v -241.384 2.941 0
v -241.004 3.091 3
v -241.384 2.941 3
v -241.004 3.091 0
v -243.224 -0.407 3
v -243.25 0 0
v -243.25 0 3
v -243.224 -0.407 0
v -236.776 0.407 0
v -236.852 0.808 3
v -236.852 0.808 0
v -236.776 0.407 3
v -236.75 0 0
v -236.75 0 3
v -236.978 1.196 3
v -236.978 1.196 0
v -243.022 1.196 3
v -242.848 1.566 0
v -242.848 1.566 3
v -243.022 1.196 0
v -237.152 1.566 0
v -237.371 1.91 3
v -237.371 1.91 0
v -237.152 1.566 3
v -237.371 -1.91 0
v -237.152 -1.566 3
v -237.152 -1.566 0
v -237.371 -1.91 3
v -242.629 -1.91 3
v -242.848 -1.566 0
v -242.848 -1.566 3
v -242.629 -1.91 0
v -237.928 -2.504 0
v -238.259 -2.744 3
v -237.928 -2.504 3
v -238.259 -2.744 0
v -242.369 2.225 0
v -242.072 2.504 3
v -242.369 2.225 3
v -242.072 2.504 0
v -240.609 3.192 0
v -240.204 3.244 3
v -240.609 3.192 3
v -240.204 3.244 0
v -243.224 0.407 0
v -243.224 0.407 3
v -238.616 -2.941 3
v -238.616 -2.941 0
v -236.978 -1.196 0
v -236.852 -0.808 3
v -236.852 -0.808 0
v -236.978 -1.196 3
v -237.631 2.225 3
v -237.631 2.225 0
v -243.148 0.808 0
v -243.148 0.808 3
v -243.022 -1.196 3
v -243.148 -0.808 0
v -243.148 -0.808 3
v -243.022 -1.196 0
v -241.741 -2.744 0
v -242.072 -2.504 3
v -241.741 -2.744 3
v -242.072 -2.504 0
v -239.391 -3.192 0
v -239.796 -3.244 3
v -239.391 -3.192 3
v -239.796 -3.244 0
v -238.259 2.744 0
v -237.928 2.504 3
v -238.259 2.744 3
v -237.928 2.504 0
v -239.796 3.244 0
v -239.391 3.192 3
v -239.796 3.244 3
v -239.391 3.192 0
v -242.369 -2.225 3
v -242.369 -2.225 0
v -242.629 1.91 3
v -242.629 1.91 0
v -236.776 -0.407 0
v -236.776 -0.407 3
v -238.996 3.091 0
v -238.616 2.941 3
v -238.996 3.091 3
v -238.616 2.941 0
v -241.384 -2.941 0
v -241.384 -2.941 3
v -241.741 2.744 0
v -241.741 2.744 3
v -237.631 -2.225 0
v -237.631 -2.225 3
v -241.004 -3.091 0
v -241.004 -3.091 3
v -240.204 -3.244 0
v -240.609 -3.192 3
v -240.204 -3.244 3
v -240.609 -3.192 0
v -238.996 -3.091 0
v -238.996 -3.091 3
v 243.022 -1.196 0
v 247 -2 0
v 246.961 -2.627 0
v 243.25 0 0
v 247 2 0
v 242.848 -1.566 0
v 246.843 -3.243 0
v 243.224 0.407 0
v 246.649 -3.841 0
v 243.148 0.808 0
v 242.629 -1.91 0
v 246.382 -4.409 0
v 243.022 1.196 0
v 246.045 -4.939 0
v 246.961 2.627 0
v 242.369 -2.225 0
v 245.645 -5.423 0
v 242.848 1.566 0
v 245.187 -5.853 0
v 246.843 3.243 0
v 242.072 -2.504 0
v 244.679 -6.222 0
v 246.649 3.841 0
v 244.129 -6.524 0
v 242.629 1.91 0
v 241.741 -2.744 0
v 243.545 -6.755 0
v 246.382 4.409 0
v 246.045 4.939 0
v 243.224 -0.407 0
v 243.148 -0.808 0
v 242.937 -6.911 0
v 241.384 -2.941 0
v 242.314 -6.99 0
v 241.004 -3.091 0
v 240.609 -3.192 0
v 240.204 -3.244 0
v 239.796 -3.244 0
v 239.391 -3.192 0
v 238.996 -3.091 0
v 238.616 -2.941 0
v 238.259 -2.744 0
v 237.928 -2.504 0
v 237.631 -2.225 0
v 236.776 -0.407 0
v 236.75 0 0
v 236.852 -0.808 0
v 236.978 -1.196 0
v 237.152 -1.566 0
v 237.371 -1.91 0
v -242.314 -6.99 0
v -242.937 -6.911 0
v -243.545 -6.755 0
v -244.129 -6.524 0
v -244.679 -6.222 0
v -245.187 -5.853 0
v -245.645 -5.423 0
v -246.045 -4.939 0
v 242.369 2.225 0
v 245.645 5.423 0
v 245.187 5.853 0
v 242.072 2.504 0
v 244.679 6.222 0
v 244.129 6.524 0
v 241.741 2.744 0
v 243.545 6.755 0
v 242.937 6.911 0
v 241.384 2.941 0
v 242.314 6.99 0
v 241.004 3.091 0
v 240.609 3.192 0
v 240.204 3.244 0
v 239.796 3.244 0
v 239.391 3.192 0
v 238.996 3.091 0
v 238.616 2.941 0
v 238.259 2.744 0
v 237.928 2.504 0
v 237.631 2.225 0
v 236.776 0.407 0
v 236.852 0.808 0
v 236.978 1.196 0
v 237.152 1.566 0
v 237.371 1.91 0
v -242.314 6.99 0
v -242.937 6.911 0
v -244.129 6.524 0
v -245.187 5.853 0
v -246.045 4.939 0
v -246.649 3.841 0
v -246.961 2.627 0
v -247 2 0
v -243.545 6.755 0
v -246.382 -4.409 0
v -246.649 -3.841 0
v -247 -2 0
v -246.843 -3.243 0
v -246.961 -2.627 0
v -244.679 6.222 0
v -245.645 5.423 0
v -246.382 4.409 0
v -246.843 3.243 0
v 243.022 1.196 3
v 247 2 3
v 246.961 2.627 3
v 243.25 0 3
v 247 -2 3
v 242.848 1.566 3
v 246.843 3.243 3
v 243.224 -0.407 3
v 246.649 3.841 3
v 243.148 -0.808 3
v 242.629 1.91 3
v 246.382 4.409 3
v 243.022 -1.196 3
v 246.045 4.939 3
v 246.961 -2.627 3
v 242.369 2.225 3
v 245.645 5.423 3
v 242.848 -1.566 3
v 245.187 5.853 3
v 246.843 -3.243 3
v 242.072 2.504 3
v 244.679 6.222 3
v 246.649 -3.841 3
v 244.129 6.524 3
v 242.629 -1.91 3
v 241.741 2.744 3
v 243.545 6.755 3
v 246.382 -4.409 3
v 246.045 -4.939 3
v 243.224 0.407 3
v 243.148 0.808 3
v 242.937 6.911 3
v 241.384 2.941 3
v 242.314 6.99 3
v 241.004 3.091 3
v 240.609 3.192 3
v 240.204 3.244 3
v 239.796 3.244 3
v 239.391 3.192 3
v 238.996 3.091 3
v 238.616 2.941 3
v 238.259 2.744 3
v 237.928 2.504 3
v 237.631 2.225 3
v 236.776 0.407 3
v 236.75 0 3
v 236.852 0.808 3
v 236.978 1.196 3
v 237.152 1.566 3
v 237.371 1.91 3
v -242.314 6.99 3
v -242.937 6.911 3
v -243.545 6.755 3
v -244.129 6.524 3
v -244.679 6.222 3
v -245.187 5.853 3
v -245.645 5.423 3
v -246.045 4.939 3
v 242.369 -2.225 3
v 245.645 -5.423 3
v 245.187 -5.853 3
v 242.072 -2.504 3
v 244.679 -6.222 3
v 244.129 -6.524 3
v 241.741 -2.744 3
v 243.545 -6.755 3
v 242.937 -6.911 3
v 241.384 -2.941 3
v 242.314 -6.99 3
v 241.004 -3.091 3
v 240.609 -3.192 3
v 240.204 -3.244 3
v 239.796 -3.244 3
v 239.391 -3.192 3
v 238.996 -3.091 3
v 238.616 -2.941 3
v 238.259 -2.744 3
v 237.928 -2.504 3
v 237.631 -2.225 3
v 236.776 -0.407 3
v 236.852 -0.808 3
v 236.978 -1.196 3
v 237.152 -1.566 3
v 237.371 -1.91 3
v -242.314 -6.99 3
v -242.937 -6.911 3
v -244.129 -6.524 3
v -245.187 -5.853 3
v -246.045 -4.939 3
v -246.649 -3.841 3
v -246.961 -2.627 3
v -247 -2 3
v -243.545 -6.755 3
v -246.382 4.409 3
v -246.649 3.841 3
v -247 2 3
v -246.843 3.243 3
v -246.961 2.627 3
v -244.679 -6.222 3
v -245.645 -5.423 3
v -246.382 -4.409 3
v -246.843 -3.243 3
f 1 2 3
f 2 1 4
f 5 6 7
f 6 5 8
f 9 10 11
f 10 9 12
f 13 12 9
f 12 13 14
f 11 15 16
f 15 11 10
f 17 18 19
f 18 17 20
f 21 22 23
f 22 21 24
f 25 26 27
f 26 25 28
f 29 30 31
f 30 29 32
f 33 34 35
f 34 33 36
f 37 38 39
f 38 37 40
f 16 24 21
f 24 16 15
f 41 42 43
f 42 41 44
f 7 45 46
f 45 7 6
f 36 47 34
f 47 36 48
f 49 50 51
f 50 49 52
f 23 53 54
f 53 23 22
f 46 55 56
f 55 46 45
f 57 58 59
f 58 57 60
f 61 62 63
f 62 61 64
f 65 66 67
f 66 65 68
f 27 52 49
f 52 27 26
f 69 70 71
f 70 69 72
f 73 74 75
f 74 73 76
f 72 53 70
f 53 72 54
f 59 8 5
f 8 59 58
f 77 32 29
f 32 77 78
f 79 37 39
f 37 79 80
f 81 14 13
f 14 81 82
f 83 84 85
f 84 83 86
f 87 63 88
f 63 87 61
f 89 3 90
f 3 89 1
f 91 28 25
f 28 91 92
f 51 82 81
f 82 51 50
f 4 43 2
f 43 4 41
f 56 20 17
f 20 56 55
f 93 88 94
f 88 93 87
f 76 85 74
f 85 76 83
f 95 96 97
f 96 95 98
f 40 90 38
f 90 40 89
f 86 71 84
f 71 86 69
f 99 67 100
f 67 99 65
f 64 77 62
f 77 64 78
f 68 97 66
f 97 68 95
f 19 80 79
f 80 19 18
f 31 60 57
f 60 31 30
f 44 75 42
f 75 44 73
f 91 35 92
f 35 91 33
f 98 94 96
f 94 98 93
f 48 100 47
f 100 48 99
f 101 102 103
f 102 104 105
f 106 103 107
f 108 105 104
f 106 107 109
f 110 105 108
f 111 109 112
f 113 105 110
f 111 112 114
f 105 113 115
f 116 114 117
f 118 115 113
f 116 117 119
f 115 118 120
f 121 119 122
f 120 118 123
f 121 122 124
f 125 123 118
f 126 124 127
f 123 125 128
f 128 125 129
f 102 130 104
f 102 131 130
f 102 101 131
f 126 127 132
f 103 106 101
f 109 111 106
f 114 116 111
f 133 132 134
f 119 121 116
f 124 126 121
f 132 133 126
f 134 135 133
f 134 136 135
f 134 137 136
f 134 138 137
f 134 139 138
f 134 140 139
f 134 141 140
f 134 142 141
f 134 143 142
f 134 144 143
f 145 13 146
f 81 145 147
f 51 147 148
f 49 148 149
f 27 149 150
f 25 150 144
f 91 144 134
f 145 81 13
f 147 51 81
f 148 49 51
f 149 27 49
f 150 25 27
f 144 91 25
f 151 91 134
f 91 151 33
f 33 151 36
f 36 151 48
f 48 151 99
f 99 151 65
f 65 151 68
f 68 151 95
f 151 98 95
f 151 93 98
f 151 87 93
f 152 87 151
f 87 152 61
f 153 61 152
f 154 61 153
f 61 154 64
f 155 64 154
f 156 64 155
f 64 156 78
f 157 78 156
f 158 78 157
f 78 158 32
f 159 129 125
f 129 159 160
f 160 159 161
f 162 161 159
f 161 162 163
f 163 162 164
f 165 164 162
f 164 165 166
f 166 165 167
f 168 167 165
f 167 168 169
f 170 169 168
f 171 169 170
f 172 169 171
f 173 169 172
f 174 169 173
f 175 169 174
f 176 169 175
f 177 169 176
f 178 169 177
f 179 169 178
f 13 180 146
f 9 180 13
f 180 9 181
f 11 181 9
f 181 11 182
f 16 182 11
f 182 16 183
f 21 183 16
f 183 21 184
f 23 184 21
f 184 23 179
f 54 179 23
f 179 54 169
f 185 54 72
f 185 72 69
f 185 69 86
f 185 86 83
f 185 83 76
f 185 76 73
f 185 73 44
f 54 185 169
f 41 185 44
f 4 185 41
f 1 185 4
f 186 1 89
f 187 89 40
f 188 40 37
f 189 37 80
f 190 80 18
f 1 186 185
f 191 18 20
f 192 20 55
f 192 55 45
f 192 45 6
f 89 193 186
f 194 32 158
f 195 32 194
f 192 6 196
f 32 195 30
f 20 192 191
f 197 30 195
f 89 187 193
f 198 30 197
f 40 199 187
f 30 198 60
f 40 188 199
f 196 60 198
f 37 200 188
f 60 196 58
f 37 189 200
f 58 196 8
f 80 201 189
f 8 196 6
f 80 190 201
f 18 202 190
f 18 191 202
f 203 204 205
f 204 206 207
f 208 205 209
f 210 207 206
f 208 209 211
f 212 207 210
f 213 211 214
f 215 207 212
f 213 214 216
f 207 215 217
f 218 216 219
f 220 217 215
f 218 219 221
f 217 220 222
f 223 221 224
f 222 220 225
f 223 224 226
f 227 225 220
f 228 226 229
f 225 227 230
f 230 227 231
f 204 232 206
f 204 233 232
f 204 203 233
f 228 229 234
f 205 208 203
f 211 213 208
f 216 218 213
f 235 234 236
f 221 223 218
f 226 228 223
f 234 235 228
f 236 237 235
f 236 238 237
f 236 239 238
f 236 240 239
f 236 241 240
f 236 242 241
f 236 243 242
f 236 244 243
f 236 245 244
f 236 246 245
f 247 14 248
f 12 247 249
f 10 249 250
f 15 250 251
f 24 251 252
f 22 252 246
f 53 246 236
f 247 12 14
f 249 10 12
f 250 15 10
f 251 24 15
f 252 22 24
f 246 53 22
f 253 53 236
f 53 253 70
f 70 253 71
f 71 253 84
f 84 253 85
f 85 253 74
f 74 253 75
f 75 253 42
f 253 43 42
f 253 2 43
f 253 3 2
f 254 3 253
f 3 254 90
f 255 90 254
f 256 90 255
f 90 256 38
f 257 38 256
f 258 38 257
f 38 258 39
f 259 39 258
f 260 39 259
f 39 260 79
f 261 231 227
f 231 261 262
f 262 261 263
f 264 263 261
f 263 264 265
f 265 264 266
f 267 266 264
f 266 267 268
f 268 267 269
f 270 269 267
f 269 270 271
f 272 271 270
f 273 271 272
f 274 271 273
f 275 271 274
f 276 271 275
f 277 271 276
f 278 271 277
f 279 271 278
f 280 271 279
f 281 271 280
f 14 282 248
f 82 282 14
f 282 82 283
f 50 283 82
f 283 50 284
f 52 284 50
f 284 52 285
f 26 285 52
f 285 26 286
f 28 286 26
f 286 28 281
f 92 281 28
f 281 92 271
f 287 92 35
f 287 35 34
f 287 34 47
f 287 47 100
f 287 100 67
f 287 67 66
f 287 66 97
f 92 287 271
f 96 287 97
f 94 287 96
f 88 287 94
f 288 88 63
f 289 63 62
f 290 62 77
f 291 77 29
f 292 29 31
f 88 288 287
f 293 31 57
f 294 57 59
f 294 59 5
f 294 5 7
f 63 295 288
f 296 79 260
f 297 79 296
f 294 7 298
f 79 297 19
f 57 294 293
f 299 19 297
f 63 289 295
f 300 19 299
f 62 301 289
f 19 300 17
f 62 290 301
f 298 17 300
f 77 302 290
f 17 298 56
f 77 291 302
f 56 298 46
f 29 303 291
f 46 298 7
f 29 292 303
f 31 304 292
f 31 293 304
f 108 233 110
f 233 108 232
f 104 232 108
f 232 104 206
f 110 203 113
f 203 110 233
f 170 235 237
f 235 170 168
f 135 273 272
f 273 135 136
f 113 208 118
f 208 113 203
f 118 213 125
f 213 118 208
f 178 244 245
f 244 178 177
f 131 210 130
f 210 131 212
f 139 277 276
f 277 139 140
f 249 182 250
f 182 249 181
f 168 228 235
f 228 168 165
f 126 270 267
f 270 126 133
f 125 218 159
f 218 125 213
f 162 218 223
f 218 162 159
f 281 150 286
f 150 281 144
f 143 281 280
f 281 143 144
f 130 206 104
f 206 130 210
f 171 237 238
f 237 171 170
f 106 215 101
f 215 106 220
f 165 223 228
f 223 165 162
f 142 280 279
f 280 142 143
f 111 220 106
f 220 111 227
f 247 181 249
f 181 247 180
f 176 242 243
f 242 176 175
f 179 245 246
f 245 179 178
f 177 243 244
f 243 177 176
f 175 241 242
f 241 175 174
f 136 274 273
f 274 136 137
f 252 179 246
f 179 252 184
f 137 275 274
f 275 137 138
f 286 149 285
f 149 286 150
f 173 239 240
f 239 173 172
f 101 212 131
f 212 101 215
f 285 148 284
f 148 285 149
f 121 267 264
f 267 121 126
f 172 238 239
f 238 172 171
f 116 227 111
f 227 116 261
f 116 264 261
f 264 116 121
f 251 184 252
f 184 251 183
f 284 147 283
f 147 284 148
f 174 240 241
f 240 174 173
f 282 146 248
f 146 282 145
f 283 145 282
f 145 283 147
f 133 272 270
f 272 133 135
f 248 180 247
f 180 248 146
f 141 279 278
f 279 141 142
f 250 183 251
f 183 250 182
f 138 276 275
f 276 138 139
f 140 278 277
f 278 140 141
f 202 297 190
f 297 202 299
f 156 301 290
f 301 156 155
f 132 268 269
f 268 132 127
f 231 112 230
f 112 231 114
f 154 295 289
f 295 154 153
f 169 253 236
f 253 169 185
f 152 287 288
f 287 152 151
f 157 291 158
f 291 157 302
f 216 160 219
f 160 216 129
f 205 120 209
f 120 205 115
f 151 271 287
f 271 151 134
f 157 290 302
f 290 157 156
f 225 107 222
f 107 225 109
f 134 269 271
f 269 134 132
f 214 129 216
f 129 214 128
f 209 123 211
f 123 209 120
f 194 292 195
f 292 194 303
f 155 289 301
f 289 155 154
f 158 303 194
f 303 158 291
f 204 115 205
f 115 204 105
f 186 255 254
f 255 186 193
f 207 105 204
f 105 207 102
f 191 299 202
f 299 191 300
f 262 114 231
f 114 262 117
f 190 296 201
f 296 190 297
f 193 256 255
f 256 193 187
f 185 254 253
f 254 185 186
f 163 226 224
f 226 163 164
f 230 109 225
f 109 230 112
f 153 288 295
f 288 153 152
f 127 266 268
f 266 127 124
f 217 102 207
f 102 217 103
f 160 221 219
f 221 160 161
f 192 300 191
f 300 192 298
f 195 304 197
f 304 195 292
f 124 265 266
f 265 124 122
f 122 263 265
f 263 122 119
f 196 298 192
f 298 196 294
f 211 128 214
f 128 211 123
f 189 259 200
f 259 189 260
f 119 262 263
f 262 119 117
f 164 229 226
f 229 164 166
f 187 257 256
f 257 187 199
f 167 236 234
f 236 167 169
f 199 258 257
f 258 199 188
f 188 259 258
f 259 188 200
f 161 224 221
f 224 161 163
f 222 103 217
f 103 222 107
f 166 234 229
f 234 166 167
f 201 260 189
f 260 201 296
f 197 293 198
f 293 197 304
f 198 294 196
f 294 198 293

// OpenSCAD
$fn = 50;


difference() {
	union() {
		hull() {
			translate(v = [-242.0000000000, 2.0000000000, 0]) {
				cylinder(h = 3, r = 5);
			}
			translate(v = [242.0000000000, 2.0000000000, 0]) {
				cylinder(h = 3, r = 5);
			}
			translate(v = [-242.0000000000, -2.0000000000, 0]) {
				cylinder(h = 3, r = 5);
			}
			translate(v = [242.0000000000, -2.0000000000, 0]) {
				cylinder(h = 3, r = 5);
			}
		}
	}
	union() {
		translate(v = [-240.0000000000, 0.0000000000, 0]) {
			cylinder(h = 3, r = 3.2500000000);
		}
		translate(v = [240.0000000000, 0.0000000000, 0]) {
			cylinder(h = 3, r = 3.2500000000);
		}
		translate(v = [-240.0000000000, 0.0000000000, 0]) {
			cylinder(h = 3, r = 1.8000000000);
		}
		translate(v = [240.0000000000, 0.0000000000, 0]) {
			cylinder(h = 3, r = 1.8000000000);
		}
		translate(v = [-240.0000000000, 0.0000000000, 0]) {
			cylinder(h = 3, r = 1.8000000000);
		}
		translate(v = [240.0000000000, 0.0000000000, 0]) {
			cylinder(h = 3, r = 1.8000000000);
		}
		translate(v = [-240.0000000000, 0.0000000000, 0]) {
			cylinder(h = 3, r = 1.8000000000);
		}
		translate(v = [240.0000000000, 0.0000000000, 0]) {
			cylinder(h = 3, r = 1.8000000000);
		}
	}
}
